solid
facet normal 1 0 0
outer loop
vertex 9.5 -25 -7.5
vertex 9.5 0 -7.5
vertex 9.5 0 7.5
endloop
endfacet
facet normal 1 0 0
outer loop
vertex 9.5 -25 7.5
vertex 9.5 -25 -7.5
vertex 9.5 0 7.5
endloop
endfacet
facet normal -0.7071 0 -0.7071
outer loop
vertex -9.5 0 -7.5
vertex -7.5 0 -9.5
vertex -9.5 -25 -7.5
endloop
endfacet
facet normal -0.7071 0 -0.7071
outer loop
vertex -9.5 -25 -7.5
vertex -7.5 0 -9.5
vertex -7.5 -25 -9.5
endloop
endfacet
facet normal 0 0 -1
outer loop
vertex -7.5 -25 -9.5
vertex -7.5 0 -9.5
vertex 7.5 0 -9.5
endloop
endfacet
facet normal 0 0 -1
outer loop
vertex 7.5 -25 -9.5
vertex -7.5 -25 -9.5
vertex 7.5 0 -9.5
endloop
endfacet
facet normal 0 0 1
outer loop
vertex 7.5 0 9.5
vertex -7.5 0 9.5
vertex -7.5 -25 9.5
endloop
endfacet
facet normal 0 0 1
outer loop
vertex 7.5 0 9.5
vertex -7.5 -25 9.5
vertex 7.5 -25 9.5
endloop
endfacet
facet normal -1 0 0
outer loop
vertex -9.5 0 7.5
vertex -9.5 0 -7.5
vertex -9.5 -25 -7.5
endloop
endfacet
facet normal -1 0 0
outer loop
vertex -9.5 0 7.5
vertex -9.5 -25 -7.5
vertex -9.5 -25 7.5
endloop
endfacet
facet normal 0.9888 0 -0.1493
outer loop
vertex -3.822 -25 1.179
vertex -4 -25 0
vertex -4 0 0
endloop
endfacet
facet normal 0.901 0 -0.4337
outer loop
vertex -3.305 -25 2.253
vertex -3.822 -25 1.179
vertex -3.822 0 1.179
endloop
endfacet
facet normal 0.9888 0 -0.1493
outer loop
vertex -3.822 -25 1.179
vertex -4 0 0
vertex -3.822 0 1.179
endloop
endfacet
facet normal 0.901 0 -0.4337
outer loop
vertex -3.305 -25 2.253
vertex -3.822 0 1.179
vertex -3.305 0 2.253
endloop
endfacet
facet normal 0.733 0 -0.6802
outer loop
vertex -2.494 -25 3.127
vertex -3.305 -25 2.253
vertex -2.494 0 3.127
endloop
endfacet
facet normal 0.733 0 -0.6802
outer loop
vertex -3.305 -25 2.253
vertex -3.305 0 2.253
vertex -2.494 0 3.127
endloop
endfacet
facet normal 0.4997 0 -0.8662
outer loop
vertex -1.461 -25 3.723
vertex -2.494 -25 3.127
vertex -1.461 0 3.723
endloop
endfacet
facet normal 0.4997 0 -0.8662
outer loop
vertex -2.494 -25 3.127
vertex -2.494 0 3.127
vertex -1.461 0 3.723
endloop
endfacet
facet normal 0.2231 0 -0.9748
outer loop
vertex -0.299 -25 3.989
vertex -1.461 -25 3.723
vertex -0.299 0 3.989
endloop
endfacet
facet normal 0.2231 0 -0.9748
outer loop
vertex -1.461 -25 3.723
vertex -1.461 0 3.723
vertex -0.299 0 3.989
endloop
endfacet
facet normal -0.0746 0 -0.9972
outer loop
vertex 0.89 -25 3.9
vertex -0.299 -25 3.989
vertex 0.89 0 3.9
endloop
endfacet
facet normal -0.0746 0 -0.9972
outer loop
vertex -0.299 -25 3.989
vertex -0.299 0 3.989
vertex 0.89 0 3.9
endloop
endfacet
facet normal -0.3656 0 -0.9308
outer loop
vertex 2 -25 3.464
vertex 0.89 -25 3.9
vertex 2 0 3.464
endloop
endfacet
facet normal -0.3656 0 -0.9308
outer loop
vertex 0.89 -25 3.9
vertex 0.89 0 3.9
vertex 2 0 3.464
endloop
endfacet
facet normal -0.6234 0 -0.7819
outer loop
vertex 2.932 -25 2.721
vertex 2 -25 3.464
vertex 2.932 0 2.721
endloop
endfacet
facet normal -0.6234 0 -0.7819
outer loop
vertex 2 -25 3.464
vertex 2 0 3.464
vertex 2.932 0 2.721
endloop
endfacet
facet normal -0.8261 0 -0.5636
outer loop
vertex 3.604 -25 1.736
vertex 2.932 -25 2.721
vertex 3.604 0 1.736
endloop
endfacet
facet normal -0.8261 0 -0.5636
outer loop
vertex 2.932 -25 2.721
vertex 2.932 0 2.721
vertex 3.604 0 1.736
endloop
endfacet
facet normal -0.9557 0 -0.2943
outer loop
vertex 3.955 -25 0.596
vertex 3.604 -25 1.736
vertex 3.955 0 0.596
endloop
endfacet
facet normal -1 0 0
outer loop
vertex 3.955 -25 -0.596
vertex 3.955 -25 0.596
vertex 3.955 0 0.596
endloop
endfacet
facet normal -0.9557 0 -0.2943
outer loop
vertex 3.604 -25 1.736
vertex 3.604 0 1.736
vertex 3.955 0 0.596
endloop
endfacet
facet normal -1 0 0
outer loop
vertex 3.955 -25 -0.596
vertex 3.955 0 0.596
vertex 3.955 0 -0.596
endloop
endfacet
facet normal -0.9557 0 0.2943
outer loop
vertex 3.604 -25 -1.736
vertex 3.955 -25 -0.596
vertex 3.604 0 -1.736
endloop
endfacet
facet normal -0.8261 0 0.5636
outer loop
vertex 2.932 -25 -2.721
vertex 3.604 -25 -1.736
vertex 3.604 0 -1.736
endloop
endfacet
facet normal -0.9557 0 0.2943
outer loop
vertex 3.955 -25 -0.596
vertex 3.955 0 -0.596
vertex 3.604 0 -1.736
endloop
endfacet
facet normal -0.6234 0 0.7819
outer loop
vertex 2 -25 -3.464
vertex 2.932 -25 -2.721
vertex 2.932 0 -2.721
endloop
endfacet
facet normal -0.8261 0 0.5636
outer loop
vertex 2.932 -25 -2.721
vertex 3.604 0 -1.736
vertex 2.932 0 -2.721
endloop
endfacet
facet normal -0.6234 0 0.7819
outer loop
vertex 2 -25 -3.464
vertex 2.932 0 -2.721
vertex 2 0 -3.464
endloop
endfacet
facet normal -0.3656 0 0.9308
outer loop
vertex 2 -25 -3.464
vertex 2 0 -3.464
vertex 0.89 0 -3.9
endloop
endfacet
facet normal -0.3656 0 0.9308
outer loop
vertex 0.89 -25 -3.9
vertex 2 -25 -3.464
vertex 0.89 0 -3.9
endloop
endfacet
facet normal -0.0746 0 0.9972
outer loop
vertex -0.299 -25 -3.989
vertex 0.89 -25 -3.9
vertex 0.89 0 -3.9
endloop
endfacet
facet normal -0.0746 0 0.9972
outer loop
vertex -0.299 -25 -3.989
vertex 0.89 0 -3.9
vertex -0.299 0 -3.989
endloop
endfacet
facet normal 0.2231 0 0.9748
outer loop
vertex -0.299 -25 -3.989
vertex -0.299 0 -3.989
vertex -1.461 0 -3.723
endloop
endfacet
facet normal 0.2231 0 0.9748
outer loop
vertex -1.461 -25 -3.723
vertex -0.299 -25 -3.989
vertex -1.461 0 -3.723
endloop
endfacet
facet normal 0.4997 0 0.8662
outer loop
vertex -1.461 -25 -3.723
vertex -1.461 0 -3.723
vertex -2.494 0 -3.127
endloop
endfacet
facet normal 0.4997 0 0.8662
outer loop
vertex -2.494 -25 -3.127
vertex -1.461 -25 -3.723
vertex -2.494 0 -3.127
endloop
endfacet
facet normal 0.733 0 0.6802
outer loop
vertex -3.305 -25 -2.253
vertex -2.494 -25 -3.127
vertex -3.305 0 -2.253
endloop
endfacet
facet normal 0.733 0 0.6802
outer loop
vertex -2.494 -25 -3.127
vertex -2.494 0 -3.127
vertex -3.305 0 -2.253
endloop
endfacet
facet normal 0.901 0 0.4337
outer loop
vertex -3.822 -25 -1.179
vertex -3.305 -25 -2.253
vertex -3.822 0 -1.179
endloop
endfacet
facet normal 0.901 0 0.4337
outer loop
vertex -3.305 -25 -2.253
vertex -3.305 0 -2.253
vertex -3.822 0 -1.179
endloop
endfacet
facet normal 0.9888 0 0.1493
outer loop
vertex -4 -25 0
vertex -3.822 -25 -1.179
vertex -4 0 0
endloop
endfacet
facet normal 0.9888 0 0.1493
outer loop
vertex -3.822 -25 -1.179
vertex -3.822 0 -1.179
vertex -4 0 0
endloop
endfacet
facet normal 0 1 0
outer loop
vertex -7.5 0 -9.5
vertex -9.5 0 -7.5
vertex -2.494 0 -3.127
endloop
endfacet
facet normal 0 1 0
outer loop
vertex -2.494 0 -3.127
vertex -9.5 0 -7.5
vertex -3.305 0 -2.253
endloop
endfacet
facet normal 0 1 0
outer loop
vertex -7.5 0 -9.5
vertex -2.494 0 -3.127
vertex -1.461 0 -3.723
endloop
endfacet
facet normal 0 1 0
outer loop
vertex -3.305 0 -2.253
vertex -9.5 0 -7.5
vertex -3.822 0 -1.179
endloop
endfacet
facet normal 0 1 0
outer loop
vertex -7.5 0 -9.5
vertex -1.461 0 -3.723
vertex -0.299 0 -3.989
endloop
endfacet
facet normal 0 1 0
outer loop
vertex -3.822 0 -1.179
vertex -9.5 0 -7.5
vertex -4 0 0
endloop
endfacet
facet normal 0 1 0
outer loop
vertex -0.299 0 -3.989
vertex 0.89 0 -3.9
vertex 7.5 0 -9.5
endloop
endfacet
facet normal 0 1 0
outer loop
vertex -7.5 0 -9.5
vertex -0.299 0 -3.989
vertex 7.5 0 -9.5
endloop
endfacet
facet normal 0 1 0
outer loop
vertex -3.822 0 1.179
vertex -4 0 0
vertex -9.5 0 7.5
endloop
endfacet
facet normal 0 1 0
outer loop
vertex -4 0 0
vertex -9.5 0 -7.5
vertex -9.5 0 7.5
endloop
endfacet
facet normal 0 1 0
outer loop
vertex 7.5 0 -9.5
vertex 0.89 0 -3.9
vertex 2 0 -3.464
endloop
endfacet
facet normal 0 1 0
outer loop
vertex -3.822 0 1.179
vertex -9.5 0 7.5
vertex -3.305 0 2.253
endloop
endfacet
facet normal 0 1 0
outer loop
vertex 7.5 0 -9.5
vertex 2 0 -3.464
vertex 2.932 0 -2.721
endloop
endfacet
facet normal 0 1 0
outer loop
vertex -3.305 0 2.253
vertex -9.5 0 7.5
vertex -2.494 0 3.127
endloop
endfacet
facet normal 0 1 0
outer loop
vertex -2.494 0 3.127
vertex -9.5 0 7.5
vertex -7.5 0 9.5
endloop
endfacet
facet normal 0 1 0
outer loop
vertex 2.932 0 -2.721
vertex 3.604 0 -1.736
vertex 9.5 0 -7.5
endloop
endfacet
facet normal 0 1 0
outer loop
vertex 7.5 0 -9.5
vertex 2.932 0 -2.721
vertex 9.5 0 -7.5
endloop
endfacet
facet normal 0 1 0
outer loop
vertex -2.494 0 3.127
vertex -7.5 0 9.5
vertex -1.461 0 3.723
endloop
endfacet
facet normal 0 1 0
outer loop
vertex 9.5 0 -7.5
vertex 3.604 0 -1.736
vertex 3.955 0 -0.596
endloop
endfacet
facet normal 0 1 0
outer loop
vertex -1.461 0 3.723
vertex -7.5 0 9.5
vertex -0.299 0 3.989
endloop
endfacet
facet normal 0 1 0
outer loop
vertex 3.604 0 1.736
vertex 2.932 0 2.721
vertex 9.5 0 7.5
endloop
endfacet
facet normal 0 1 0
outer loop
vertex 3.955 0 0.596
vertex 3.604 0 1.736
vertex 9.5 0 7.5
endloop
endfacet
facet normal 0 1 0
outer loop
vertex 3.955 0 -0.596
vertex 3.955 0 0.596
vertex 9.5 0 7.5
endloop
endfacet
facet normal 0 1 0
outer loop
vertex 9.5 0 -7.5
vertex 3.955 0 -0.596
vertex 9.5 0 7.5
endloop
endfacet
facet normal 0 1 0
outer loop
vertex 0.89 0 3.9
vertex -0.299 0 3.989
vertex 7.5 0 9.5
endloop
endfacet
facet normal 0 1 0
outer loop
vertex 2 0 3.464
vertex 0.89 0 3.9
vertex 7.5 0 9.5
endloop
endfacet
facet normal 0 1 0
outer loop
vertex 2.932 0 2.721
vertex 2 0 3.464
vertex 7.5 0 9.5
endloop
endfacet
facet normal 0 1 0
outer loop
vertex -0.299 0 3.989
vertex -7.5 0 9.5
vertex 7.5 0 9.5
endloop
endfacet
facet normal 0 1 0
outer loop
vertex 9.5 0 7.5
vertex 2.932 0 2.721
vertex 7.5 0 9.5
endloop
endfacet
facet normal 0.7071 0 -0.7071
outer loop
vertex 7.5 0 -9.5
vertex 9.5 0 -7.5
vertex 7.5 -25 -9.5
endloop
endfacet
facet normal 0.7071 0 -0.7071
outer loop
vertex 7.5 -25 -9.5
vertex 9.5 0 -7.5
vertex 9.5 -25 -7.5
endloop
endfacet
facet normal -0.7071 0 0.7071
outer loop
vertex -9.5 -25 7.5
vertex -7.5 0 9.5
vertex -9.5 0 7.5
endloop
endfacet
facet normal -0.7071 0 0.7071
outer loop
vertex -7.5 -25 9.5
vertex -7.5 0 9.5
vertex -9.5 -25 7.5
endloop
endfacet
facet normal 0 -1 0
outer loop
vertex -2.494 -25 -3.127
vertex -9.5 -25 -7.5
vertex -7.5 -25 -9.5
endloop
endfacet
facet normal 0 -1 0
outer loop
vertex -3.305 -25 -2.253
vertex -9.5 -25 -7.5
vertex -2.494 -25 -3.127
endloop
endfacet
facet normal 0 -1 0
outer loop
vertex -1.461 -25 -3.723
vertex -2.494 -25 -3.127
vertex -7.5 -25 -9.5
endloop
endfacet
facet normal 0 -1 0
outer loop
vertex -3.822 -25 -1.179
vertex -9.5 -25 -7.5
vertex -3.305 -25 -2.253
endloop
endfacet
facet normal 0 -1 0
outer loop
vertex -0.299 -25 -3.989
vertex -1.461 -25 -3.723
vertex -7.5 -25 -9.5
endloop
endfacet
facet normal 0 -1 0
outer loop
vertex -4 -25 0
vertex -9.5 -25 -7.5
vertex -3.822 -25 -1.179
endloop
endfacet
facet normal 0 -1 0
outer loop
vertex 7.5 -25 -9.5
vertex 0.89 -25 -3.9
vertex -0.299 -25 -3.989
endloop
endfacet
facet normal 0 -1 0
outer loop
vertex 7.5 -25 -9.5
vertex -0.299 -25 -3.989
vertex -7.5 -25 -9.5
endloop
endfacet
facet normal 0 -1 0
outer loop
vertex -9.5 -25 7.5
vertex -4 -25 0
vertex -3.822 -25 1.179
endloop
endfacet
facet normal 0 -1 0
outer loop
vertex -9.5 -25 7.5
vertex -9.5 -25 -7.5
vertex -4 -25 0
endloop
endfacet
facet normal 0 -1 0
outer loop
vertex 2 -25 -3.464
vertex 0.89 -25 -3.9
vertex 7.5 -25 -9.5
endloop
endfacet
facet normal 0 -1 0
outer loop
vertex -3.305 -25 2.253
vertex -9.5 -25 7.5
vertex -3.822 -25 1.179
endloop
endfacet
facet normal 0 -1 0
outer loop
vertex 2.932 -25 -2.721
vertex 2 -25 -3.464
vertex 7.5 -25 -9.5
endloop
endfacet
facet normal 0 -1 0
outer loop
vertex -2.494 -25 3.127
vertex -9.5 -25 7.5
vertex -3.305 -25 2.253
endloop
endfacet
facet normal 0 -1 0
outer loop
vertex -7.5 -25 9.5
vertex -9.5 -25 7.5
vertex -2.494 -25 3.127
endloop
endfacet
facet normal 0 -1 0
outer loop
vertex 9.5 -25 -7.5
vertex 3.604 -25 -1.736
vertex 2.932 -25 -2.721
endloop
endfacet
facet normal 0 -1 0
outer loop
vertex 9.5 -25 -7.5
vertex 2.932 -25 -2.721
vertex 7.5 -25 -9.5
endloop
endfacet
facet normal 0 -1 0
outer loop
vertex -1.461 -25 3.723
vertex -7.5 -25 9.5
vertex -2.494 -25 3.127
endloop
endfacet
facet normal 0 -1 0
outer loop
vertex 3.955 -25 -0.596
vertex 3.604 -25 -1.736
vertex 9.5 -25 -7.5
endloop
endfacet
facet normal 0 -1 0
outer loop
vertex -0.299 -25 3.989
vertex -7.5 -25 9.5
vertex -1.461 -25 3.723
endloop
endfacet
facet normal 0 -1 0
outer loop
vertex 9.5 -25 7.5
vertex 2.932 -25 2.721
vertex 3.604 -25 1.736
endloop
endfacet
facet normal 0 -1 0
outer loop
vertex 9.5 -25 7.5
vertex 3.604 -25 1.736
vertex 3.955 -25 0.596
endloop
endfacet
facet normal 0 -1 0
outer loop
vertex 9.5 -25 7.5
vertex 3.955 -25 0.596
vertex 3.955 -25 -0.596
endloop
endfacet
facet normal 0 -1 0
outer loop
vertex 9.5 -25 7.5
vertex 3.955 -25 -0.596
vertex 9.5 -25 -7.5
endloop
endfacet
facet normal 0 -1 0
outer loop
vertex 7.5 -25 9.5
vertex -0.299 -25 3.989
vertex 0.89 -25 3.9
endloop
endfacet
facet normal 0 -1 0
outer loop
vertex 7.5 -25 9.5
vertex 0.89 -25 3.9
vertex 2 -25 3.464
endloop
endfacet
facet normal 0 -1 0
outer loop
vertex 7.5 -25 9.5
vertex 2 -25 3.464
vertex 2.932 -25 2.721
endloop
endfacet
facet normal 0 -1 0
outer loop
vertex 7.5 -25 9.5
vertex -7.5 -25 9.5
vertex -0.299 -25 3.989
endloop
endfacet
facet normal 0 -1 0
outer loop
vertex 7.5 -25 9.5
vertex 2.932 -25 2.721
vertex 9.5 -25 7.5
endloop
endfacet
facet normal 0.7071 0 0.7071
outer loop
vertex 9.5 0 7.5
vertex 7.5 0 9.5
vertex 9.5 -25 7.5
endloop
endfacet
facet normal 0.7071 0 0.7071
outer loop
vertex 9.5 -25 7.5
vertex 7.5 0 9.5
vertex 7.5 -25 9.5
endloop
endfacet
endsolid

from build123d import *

# Parameters (mm, degrees)
F0_W     = 19
F0_H     = 19
F1_DEPTH = 25
F3_SIZE  = 2
F4_SIZE  = 2
F5_SIZE  = 2
F2_R     = 4
F6_DEPTH = 25


with BuildPart() as f1:
    # F0 (on Front) → F1 (new body)
    with BuildSketch(Plane.XZ):
        Rectangle(F0_W, F0_H)
    extrude(amount=F1_DEPTH)

    # F3
    f3_edges = [f1.edges().sort_by_distance(p)[0] for p in [
        (9.5, -12.5, -9.5),
        (9.5, -12.5, 9.5),
    ]]
    chamfer(f3_edges, length=F3_SIZE)

    # F4
    f4_edges = [f1.edges().sort_by_distance(p)[0] for p in [
        (-9.5, -12.5, 9.5),
    ]]
    chamfer(f4_edges, length=F4_SIZE)

    # F5
    f5_edges = [f1.edges().sort_by_distance(p)[0] for p in [
        (-9.5, -12.5, -9.5),
    ]]
    chamfer(f5_edges, length=F5_SIZE)

    # F2 (on face) → F6 (cut)
    with BuildSketch(Plane(origin=(0, 0, 0), x_dir=(-1, 0, 0), z_dir=(0, 1, 0))):
        Circle(F2_R)
    extrude(amount=-F6_DEPTH, mode=Mode.SUBTRACT)


solid = f1.part
